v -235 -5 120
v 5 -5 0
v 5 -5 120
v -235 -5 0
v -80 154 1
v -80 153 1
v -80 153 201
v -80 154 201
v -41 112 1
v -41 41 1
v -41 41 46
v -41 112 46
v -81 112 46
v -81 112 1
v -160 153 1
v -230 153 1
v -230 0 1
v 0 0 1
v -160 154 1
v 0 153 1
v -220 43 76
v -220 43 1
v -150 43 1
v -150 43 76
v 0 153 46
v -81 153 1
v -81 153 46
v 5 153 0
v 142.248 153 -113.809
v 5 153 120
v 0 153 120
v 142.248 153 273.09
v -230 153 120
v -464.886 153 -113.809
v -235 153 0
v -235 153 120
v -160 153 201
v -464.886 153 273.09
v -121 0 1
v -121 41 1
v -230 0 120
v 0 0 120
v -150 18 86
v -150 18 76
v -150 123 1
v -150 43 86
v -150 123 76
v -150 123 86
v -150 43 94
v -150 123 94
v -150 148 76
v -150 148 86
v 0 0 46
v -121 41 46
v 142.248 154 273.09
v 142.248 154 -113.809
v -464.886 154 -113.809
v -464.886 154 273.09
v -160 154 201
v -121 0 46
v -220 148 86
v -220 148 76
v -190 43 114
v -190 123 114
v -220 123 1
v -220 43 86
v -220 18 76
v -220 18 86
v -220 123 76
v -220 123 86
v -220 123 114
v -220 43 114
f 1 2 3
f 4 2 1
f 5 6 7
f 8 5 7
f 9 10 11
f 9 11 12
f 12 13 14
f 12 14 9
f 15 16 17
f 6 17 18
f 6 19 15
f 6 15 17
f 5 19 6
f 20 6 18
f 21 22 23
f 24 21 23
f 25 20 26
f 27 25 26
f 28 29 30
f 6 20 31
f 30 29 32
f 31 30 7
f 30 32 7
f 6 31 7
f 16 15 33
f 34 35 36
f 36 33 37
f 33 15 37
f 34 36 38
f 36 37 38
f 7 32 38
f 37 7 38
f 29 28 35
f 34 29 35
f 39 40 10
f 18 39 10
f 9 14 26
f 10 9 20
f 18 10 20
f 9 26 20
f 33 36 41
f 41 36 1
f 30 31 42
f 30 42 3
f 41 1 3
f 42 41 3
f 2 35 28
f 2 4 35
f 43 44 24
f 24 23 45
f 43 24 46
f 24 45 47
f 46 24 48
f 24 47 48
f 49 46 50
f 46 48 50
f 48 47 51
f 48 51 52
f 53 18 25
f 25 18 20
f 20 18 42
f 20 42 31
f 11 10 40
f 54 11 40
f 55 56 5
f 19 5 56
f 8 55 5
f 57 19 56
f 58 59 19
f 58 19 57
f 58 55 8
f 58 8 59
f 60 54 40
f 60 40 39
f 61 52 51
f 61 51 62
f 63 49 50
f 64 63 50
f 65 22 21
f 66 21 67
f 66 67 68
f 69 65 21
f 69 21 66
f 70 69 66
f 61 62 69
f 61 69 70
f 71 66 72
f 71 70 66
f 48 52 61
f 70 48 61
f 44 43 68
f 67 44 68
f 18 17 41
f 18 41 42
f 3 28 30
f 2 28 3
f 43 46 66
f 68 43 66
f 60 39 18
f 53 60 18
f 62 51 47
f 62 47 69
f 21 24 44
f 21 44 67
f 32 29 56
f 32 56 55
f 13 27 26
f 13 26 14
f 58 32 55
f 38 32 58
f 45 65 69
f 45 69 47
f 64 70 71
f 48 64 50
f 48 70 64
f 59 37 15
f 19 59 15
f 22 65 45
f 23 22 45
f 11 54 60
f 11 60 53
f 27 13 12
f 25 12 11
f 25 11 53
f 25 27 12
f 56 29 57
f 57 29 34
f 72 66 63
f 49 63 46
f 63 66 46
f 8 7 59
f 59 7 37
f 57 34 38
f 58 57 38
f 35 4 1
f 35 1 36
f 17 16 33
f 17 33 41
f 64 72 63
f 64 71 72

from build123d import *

# Parameters (mm, degrees)
F0_W      = 230
F0_H      = 153
F1_DEPTH  = 1
F3_DEPTH  = 120
F4_W      = 607.133641839
F4_H      = 386.898599565
F5_DEPTH  = 1
F6_W      = 41
F6_H      = 71
F7_DEPTH  = 45
F8_W      = 70
F8_H      = 80
F9_DEPTH  = 113
F11_W     = 70
F11_H     = 10
F12_DEPTH = 65
F13_SIZE2 = 20
F13_SIZE  = 40


with BuildPart() as f1:
    # F0 (on Top) → F1 (new body)
    with BuildSketch(Plane.XY):
        with Locations((-115, 76.5)):
            Rectangle(F0_W, F0_H)
    extrude(amount=F1_DEPTH)

    # F2 (on face) → F3 (join)
    with BuildSketch(Plane(origin=(0, 0, 0), x_dir=(1, 0, 0), z_dir=(0, 0, -1))):
        Polygon((-230, -153), (-230, 0), (0, 0), (0, -153), (5, -153), (5, 5), (-235, 5), (-235, -153), align=None)
    extrude(amount=-F3_DEPTH)

    # F4 (on face) → F5 (join)
    with BuildSketch(Plane(origin=(0, 153, 0), x_dir=(-1, 0, 0), z_dir=(0, 1, 0))):
        with Locations((161.3193079829, 79.6407647431)):
            Rectangle(F4_W, F4_H)
        Polygon((0, 120), (0, 1), (80, 1), (80, 201), (160, 201), (160, 1), (230, 1), (230, 120), (235, 120), (235, 0), (-5, 0), (-5, 120), align=None, mode=Mode.SUBTRACT)
        Polygon((80, 1), (0, 1), (0, 120), (-5, 120), (-5, 0), (235, 0), (235, 120), (230, 120), (230, 1), (160, 1), align=None)
    extrude(amount=F5_DEPTH)


with BuildPart() as f7:
    # F6 (on face) → F7 (new body)
    with BuildSketch(Plane.XY.offset(1)):
        Polygon((-41, 112), (0, 112), (0, 153), (-80, 153), (-81, 153), (-81, 112), align=None)
        with Locations((-20.5, 76.5)):
            Rectangle(F6_W, F6_H)
        Polygon((-121, 41), (-121, 0), (0, 0), (0, 41), (-41, 41), align=None)
    extrude(amount=F7_DEPTH)


with BuildPart() as f9:
    # F8 (on face) → F9 (new body)
    with BuildSketch(Plane.XY.offset(1)):
        with Locations((-185, 83)):
            Rectangle(F8_W, F8_H)
    extrude(amount=F9_DEPTH)

    # F11 (on offset) → F12 (join, symmetric)
    with BuildSketch(Plane(origin=(0, 83, 0), x_dir=(-1, 0, 0), z_dir=(0, 1, 0))):
        with Locations((185, 81)):
            Rectangle(F11_W, F11_H)
    extrude(amount=F12_DEPTH, both=True)

    # F13
    f13_edges = [f9.edges().sort_by_distance(p)[0] for p in [
        (-150, 83, 114),
    ]]
    f13_side = f9.faces().sort_by_distance((-185, 83, 114))[0]
    chamfer(f13_edges, length=F13_SIZE, length2=F13_SIZE2, reference=f13_side)


solid = Compound([f1.part, f7.part, f9.part])
